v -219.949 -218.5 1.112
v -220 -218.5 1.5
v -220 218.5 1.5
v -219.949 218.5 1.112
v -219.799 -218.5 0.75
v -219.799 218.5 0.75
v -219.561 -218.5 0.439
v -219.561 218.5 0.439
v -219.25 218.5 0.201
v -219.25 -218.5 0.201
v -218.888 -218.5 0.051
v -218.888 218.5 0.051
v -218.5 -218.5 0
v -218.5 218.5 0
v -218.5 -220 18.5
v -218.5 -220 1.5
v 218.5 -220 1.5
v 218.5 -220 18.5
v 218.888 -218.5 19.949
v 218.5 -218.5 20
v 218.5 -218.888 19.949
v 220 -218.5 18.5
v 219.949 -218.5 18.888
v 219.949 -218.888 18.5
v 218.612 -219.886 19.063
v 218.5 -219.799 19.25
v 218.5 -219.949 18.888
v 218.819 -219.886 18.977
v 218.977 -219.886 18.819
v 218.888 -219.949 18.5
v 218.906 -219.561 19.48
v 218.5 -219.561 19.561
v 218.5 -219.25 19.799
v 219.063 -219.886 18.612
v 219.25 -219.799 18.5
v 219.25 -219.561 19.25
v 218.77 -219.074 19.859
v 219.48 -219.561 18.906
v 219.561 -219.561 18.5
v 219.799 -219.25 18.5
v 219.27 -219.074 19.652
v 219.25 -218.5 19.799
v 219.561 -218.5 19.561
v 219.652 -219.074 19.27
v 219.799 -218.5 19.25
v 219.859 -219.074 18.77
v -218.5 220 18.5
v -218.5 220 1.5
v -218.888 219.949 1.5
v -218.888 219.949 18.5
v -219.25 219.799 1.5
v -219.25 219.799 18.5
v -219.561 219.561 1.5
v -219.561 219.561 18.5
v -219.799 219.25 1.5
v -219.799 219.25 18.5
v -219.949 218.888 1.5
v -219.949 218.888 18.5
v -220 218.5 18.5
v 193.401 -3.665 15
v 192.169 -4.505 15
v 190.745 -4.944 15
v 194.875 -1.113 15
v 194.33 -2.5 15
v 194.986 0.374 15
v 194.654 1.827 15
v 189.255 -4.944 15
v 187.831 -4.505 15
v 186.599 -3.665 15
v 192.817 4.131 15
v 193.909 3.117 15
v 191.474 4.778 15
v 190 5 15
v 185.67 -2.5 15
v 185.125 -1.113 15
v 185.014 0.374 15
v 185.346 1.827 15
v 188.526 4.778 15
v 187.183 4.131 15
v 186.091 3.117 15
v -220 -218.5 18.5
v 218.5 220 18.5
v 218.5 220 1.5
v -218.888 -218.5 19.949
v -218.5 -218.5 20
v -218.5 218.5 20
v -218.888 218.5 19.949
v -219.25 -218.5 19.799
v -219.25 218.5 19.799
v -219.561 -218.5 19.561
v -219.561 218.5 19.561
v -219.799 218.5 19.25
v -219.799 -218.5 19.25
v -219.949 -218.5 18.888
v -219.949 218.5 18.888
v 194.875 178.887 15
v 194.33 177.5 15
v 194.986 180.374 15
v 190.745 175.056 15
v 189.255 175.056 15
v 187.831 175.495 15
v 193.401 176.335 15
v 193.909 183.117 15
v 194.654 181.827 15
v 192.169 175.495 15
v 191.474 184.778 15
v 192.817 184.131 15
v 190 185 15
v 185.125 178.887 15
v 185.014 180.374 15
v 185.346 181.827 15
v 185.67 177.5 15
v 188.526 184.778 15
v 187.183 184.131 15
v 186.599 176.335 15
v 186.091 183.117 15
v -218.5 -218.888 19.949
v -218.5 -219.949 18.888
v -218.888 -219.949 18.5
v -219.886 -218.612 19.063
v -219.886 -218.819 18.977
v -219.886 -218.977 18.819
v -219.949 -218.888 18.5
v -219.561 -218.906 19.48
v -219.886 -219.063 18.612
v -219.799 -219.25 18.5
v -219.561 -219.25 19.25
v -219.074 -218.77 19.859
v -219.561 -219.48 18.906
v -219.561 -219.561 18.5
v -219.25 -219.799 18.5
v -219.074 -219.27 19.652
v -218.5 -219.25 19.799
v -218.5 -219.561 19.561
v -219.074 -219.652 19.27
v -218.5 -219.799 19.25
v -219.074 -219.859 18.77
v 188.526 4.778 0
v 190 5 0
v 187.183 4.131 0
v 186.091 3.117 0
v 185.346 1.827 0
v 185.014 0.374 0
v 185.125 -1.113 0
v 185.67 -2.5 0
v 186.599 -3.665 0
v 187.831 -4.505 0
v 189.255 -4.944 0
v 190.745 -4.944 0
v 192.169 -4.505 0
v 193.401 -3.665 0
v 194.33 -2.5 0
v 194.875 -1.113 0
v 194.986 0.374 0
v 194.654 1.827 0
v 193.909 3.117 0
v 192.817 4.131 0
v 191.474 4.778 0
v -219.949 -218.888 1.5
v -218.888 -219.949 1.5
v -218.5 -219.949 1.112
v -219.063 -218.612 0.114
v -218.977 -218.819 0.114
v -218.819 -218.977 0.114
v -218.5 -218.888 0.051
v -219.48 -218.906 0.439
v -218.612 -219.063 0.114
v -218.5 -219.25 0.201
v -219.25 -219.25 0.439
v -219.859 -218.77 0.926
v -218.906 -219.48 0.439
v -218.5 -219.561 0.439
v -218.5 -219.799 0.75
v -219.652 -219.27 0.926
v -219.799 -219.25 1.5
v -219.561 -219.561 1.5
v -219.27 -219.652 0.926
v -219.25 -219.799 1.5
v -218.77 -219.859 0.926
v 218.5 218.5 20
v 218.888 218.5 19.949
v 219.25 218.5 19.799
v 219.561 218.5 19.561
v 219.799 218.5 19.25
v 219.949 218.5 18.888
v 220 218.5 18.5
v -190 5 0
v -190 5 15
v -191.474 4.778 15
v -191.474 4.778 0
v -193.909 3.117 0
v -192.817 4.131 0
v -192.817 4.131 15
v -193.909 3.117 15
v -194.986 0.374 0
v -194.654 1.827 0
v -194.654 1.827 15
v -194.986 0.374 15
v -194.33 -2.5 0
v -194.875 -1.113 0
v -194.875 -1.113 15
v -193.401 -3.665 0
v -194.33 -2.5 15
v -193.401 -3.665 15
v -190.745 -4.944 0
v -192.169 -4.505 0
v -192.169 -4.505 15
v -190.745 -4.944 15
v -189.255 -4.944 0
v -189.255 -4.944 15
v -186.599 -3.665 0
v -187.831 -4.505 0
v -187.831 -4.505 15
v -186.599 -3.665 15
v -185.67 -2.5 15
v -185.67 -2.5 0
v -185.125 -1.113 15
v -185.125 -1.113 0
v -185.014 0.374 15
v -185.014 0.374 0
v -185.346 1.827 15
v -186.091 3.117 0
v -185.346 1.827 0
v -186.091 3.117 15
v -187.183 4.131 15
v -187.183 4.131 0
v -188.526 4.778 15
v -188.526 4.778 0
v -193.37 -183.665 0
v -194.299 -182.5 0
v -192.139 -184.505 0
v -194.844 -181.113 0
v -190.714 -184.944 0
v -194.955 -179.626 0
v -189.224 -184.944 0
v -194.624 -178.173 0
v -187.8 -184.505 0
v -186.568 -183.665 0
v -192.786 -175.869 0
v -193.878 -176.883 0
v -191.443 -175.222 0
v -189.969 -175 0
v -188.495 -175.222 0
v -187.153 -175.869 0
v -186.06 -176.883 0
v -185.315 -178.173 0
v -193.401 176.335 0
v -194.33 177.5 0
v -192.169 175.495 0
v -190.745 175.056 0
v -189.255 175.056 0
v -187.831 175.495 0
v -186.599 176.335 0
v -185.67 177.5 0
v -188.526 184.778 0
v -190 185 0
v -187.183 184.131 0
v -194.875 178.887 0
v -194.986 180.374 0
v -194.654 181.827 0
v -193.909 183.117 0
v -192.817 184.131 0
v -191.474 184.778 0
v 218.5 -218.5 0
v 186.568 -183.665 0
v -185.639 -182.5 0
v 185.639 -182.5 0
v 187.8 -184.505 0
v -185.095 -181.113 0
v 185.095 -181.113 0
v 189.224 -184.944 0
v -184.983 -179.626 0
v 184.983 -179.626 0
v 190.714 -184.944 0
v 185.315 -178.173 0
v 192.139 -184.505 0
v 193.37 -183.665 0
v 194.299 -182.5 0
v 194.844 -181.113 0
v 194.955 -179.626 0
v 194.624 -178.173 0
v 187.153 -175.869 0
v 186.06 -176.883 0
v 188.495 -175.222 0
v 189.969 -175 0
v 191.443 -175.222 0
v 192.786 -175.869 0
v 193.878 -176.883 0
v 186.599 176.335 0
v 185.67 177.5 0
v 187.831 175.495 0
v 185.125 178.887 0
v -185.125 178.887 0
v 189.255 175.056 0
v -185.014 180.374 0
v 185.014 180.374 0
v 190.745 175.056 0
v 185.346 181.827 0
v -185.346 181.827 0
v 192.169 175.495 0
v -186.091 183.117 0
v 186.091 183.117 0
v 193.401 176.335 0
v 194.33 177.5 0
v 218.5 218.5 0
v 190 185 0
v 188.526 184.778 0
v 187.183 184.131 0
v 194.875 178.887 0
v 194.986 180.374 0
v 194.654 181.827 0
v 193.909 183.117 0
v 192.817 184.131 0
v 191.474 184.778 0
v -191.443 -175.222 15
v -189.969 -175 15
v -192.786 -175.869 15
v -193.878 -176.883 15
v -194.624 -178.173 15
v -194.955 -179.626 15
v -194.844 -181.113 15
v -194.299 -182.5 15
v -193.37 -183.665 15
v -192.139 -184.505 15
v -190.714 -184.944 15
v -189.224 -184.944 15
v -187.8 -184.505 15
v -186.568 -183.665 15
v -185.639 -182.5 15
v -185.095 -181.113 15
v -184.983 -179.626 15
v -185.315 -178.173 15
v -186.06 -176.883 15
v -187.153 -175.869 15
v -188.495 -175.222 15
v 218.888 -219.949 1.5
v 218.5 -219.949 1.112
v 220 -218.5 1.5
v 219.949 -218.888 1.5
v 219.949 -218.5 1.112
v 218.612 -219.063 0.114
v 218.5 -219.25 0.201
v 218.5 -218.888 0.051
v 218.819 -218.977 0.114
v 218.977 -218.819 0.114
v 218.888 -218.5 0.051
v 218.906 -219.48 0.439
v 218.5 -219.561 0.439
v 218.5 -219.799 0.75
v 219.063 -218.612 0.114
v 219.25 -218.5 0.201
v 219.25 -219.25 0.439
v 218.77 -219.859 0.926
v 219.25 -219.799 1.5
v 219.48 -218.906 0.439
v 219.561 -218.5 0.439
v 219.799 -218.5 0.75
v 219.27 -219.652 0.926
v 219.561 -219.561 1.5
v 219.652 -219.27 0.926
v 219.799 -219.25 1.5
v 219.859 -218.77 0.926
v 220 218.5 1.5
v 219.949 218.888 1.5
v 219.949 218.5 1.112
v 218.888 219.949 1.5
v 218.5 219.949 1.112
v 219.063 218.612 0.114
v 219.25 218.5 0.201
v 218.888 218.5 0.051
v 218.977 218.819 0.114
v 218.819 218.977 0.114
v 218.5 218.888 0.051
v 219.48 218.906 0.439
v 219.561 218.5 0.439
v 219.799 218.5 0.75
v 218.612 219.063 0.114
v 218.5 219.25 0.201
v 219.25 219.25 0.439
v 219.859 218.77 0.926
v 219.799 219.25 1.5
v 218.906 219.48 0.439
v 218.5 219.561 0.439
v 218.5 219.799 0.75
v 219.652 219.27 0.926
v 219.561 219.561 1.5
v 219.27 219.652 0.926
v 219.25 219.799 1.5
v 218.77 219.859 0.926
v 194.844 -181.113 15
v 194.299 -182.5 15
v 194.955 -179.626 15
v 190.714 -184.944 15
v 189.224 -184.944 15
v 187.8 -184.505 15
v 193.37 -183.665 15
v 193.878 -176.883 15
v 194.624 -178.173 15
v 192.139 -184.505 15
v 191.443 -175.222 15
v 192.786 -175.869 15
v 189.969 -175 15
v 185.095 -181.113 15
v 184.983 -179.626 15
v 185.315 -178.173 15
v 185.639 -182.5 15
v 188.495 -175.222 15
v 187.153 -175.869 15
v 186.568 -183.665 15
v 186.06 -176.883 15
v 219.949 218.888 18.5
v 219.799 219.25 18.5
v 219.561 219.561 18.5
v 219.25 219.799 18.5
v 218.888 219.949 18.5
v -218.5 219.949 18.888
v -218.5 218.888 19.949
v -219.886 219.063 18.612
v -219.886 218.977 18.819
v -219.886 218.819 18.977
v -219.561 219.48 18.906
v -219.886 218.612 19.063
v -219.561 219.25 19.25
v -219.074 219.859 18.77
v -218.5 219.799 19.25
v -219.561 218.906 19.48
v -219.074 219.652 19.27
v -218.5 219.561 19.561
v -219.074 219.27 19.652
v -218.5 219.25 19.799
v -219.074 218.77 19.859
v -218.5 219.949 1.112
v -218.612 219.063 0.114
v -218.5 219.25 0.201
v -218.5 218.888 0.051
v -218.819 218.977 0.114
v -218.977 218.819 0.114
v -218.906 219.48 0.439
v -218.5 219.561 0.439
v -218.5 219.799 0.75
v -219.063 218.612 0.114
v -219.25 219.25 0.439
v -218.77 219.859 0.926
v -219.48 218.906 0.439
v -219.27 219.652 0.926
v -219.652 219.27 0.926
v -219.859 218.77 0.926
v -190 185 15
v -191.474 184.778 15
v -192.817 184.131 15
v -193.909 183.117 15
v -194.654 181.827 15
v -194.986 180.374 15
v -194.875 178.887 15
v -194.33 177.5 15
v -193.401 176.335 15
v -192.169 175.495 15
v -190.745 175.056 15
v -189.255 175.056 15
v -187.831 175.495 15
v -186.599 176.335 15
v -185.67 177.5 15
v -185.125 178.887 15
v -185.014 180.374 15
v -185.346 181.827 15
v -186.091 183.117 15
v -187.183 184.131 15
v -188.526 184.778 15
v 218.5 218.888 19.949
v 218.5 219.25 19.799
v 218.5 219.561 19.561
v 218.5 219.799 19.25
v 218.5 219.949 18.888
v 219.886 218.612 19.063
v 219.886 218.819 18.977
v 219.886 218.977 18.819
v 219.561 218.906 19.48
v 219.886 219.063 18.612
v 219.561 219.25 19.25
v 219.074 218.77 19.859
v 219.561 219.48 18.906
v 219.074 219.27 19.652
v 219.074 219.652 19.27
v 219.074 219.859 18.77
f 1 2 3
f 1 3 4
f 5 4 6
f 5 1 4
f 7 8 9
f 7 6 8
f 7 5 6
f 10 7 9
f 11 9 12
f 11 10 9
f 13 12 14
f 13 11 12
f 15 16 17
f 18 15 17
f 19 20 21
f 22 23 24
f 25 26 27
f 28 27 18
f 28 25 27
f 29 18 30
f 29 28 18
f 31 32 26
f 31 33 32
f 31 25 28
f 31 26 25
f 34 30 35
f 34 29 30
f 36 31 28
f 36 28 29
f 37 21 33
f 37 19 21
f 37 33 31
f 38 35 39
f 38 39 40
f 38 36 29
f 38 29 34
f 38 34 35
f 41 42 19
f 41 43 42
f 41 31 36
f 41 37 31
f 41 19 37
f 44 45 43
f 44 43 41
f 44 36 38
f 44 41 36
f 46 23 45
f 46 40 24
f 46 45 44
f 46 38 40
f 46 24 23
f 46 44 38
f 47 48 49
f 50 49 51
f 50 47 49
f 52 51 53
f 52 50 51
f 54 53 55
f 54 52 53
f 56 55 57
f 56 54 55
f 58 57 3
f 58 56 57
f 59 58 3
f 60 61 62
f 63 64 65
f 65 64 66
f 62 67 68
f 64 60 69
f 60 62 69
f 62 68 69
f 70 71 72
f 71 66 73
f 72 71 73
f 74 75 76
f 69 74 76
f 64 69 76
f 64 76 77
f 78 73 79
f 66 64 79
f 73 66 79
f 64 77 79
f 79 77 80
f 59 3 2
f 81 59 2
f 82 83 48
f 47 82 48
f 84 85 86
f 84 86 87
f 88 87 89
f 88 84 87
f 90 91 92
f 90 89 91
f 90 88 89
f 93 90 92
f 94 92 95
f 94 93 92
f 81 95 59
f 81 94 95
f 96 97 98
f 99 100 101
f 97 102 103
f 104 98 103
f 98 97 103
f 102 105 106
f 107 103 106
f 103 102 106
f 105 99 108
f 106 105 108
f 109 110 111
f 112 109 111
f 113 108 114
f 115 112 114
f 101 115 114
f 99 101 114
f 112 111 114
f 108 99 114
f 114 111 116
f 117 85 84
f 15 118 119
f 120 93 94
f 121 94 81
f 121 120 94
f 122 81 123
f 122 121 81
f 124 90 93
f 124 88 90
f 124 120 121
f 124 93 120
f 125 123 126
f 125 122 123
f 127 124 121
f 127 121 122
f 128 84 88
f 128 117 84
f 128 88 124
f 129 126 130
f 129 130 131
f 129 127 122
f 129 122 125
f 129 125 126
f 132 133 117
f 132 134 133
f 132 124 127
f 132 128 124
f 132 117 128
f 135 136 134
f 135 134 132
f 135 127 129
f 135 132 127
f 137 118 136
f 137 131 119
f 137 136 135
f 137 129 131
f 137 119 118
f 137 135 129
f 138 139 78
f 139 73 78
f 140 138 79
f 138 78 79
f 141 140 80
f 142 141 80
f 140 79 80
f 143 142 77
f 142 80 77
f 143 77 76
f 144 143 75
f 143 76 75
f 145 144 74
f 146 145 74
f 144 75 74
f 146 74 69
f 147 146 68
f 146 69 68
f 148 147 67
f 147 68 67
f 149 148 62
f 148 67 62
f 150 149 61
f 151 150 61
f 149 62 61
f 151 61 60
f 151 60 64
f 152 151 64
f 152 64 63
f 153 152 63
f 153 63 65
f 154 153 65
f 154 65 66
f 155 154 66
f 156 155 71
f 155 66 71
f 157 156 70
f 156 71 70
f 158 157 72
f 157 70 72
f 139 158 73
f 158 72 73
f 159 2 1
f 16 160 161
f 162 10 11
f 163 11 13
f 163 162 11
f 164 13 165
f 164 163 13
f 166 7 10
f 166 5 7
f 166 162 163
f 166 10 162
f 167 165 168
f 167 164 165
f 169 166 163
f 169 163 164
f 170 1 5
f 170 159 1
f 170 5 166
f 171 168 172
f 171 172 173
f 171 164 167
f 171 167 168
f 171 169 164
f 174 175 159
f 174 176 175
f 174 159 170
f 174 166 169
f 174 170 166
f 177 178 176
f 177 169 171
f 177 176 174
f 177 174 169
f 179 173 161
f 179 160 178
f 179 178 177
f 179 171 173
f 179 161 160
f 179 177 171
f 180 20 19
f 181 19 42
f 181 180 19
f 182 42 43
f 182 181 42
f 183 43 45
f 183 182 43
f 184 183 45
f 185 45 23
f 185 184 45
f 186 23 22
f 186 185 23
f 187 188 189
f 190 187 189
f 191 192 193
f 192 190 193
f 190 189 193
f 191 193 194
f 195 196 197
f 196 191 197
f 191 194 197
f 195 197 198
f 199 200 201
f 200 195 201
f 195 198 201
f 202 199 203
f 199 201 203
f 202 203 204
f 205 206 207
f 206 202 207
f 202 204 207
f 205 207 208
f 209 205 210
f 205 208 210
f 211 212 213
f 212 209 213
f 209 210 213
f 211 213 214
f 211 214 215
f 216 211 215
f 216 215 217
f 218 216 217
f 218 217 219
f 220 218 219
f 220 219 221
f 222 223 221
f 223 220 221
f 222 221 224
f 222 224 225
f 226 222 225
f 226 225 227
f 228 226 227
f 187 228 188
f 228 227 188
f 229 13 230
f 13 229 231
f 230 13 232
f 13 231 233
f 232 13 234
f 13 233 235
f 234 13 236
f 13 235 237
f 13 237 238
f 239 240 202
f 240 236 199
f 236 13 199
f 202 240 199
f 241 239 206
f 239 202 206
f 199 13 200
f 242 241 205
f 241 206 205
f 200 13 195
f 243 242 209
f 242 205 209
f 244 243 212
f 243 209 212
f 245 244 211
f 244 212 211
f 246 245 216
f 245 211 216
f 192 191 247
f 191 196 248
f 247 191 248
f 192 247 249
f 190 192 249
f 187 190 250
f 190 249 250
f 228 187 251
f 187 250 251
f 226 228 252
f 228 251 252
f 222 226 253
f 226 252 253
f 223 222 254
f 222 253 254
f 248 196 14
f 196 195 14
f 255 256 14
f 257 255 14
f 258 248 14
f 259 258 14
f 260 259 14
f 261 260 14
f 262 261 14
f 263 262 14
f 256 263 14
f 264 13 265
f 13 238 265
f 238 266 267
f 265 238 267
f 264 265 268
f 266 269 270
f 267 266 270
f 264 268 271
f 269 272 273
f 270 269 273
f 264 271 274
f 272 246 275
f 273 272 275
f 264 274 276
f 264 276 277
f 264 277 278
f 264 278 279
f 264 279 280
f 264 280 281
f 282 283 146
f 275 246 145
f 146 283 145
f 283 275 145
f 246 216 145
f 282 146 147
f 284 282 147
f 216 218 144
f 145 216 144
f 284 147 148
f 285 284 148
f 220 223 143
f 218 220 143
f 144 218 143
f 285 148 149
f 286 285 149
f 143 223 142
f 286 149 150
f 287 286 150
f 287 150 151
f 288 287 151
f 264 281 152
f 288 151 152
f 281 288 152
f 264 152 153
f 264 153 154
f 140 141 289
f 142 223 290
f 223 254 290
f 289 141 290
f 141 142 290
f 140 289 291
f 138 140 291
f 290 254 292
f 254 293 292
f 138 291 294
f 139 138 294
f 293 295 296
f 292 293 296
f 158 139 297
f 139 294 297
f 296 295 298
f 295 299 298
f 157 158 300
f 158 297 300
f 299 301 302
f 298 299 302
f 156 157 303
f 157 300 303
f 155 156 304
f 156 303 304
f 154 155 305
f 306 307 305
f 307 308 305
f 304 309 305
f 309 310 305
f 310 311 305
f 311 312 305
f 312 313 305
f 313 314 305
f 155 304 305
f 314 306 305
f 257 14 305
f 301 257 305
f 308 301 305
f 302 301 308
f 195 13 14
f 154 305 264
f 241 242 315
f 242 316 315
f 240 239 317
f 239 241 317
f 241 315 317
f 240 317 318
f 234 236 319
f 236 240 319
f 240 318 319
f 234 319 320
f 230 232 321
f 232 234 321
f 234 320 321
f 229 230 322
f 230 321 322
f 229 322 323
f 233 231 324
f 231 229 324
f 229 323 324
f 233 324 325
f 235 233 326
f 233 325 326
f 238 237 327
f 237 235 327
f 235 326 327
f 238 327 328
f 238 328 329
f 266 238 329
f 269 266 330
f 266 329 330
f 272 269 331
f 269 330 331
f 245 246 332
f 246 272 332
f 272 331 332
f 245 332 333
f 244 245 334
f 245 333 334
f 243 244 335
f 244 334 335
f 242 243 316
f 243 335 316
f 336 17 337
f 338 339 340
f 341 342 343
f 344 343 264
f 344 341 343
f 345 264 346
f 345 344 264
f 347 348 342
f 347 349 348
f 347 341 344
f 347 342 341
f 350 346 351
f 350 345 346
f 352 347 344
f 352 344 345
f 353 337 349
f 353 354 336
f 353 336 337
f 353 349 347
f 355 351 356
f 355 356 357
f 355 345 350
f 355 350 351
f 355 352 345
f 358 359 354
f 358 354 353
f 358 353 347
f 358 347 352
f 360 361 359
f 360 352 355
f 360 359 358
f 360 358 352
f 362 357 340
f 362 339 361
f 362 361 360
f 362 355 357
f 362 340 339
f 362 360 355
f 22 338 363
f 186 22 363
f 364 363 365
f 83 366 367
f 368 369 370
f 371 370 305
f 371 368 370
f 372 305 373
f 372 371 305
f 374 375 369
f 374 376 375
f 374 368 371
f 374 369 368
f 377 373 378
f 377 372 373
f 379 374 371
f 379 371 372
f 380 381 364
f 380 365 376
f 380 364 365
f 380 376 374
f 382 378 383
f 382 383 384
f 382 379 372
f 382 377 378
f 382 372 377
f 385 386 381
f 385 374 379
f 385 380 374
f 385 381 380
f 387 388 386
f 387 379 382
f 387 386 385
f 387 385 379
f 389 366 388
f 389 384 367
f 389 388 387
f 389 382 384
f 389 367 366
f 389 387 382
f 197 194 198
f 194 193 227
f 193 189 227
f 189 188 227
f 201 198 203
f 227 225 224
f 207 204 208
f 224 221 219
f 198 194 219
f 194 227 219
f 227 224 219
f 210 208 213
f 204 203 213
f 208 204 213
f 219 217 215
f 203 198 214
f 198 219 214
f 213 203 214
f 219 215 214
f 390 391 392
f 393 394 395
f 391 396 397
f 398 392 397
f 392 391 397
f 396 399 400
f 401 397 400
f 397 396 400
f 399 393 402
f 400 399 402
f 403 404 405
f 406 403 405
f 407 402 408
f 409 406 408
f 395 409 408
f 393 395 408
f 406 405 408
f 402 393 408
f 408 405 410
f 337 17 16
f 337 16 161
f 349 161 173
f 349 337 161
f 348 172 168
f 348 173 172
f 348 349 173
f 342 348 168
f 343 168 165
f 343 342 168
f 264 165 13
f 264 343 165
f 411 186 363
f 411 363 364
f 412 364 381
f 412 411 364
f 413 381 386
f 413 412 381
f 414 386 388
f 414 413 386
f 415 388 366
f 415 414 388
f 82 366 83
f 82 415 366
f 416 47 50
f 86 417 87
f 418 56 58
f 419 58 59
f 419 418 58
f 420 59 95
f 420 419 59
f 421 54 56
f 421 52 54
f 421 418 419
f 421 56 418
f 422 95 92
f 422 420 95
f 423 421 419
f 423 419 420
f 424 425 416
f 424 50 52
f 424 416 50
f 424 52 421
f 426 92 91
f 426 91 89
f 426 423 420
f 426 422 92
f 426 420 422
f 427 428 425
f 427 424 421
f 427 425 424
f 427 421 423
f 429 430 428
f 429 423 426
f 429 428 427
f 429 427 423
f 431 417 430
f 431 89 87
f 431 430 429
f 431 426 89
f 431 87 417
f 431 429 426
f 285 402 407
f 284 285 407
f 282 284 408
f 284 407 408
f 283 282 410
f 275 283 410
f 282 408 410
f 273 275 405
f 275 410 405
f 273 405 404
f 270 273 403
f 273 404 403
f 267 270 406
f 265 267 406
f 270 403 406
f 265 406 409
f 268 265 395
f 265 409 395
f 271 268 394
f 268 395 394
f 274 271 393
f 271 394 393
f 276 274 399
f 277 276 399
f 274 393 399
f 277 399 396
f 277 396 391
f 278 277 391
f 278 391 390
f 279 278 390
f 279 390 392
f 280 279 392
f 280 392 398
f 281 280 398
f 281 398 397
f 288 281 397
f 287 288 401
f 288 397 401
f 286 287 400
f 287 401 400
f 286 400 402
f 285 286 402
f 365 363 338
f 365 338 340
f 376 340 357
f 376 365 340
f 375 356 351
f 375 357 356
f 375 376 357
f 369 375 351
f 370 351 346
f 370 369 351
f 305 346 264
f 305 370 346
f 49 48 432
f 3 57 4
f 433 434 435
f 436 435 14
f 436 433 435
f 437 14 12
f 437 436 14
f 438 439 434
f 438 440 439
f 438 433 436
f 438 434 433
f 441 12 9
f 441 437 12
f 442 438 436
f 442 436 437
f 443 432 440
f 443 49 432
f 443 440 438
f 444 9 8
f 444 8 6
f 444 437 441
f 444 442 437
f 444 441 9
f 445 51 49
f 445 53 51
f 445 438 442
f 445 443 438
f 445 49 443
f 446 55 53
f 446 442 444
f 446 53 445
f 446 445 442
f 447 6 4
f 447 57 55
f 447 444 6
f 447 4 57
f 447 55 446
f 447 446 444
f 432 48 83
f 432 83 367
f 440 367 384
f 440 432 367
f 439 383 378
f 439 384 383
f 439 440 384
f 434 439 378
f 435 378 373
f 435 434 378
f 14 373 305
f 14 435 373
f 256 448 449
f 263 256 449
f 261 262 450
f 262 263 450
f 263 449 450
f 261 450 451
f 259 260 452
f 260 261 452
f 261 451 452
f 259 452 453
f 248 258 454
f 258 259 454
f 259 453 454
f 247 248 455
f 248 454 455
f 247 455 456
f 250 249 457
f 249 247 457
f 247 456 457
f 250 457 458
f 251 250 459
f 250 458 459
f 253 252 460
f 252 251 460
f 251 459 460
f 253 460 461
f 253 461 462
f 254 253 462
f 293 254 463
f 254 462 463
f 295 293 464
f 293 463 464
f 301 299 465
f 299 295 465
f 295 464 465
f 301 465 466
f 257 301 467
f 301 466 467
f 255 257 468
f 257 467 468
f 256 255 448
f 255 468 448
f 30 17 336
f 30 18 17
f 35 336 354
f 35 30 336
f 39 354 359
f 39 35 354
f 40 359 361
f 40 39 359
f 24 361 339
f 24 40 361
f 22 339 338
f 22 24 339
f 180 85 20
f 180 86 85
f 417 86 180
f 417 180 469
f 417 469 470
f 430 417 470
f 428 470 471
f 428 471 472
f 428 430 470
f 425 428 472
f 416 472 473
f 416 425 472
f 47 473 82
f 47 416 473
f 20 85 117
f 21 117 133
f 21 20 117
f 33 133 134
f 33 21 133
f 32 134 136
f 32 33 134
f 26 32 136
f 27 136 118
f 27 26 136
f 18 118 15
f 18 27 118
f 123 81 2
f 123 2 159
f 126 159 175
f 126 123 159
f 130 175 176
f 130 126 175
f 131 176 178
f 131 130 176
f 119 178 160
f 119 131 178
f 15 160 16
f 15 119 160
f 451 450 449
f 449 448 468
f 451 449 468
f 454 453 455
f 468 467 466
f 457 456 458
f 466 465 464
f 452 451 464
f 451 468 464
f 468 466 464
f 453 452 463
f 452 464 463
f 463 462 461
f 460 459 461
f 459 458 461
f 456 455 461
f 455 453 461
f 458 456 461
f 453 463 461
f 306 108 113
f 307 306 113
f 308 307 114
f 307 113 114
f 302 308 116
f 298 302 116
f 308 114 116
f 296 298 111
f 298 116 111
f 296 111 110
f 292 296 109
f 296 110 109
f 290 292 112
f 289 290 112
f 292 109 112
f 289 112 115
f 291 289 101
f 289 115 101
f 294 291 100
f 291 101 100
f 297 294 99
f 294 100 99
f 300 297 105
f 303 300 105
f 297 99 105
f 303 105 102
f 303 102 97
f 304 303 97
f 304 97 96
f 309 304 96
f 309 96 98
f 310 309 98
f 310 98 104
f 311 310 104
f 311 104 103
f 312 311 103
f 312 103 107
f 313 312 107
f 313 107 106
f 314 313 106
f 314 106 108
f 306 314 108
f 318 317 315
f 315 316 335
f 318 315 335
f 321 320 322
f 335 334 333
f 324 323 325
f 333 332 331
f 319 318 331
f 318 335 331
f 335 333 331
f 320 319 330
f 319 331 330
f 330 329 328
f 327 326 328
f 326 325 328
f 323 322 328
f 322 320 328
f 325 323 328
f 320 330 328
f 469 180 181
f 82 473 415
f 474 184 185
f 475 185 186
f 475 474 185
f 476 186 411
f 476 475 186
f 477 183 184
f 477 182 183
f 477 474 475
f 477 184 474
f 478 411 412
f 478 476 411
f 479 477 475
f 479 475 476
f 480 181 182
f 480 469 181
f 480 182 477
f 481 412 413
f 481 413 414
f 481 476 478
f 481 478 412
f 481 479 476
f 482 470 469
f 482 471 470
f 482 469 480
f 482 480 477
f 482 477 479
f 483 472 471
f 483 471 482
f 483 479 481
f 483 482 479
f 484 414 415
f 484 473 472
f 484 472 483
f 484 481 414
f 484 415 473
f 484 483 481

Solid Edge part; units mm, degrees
sketch "Sketch1" plane through (0, 0, 0) normal (0, 0, 1) x (1, 0, 0)
  line L0 (-220, -220) -> (220, -220)
  line L1 (220, -220) -> (220, 220)
  line L2 (220, 220) -> (-220, 220)
  line L3 (-220, 220) -> (-220, -220)
extrude "Protrusion1" add sketch "Sketch1" along normal blind 20
fillet "Round_1" radius 1.5 12 edges at (0, 220, 20) (220, 0, 20) (0, -220, 20) (-220, 0, 20) (-220, -220, 10) (220, -220, 10) (-220, 220, 10) (220, 220, 10) (0, 220, 0) (-220, 0, 0) (220, 0, 0) (0, -220, 0)
hole "Hole_7" at (189.9692, -180, 0) direction (0, 0, 1) diameter 10 depth 15
hole "Hole1" at (190, 0, 0) direction (0, 0, 1) diameter 10 depth 15
hole "Hole2" at (190, 180, 0) direction (0, 0, 1) diameter 10 depth 15
mirror "Mirror1" about plane through (0, 0, 0) normal (1, 0, 0) of "Hole_7", "Hole1", "Hole2"
properties material "Wood, Oak"
